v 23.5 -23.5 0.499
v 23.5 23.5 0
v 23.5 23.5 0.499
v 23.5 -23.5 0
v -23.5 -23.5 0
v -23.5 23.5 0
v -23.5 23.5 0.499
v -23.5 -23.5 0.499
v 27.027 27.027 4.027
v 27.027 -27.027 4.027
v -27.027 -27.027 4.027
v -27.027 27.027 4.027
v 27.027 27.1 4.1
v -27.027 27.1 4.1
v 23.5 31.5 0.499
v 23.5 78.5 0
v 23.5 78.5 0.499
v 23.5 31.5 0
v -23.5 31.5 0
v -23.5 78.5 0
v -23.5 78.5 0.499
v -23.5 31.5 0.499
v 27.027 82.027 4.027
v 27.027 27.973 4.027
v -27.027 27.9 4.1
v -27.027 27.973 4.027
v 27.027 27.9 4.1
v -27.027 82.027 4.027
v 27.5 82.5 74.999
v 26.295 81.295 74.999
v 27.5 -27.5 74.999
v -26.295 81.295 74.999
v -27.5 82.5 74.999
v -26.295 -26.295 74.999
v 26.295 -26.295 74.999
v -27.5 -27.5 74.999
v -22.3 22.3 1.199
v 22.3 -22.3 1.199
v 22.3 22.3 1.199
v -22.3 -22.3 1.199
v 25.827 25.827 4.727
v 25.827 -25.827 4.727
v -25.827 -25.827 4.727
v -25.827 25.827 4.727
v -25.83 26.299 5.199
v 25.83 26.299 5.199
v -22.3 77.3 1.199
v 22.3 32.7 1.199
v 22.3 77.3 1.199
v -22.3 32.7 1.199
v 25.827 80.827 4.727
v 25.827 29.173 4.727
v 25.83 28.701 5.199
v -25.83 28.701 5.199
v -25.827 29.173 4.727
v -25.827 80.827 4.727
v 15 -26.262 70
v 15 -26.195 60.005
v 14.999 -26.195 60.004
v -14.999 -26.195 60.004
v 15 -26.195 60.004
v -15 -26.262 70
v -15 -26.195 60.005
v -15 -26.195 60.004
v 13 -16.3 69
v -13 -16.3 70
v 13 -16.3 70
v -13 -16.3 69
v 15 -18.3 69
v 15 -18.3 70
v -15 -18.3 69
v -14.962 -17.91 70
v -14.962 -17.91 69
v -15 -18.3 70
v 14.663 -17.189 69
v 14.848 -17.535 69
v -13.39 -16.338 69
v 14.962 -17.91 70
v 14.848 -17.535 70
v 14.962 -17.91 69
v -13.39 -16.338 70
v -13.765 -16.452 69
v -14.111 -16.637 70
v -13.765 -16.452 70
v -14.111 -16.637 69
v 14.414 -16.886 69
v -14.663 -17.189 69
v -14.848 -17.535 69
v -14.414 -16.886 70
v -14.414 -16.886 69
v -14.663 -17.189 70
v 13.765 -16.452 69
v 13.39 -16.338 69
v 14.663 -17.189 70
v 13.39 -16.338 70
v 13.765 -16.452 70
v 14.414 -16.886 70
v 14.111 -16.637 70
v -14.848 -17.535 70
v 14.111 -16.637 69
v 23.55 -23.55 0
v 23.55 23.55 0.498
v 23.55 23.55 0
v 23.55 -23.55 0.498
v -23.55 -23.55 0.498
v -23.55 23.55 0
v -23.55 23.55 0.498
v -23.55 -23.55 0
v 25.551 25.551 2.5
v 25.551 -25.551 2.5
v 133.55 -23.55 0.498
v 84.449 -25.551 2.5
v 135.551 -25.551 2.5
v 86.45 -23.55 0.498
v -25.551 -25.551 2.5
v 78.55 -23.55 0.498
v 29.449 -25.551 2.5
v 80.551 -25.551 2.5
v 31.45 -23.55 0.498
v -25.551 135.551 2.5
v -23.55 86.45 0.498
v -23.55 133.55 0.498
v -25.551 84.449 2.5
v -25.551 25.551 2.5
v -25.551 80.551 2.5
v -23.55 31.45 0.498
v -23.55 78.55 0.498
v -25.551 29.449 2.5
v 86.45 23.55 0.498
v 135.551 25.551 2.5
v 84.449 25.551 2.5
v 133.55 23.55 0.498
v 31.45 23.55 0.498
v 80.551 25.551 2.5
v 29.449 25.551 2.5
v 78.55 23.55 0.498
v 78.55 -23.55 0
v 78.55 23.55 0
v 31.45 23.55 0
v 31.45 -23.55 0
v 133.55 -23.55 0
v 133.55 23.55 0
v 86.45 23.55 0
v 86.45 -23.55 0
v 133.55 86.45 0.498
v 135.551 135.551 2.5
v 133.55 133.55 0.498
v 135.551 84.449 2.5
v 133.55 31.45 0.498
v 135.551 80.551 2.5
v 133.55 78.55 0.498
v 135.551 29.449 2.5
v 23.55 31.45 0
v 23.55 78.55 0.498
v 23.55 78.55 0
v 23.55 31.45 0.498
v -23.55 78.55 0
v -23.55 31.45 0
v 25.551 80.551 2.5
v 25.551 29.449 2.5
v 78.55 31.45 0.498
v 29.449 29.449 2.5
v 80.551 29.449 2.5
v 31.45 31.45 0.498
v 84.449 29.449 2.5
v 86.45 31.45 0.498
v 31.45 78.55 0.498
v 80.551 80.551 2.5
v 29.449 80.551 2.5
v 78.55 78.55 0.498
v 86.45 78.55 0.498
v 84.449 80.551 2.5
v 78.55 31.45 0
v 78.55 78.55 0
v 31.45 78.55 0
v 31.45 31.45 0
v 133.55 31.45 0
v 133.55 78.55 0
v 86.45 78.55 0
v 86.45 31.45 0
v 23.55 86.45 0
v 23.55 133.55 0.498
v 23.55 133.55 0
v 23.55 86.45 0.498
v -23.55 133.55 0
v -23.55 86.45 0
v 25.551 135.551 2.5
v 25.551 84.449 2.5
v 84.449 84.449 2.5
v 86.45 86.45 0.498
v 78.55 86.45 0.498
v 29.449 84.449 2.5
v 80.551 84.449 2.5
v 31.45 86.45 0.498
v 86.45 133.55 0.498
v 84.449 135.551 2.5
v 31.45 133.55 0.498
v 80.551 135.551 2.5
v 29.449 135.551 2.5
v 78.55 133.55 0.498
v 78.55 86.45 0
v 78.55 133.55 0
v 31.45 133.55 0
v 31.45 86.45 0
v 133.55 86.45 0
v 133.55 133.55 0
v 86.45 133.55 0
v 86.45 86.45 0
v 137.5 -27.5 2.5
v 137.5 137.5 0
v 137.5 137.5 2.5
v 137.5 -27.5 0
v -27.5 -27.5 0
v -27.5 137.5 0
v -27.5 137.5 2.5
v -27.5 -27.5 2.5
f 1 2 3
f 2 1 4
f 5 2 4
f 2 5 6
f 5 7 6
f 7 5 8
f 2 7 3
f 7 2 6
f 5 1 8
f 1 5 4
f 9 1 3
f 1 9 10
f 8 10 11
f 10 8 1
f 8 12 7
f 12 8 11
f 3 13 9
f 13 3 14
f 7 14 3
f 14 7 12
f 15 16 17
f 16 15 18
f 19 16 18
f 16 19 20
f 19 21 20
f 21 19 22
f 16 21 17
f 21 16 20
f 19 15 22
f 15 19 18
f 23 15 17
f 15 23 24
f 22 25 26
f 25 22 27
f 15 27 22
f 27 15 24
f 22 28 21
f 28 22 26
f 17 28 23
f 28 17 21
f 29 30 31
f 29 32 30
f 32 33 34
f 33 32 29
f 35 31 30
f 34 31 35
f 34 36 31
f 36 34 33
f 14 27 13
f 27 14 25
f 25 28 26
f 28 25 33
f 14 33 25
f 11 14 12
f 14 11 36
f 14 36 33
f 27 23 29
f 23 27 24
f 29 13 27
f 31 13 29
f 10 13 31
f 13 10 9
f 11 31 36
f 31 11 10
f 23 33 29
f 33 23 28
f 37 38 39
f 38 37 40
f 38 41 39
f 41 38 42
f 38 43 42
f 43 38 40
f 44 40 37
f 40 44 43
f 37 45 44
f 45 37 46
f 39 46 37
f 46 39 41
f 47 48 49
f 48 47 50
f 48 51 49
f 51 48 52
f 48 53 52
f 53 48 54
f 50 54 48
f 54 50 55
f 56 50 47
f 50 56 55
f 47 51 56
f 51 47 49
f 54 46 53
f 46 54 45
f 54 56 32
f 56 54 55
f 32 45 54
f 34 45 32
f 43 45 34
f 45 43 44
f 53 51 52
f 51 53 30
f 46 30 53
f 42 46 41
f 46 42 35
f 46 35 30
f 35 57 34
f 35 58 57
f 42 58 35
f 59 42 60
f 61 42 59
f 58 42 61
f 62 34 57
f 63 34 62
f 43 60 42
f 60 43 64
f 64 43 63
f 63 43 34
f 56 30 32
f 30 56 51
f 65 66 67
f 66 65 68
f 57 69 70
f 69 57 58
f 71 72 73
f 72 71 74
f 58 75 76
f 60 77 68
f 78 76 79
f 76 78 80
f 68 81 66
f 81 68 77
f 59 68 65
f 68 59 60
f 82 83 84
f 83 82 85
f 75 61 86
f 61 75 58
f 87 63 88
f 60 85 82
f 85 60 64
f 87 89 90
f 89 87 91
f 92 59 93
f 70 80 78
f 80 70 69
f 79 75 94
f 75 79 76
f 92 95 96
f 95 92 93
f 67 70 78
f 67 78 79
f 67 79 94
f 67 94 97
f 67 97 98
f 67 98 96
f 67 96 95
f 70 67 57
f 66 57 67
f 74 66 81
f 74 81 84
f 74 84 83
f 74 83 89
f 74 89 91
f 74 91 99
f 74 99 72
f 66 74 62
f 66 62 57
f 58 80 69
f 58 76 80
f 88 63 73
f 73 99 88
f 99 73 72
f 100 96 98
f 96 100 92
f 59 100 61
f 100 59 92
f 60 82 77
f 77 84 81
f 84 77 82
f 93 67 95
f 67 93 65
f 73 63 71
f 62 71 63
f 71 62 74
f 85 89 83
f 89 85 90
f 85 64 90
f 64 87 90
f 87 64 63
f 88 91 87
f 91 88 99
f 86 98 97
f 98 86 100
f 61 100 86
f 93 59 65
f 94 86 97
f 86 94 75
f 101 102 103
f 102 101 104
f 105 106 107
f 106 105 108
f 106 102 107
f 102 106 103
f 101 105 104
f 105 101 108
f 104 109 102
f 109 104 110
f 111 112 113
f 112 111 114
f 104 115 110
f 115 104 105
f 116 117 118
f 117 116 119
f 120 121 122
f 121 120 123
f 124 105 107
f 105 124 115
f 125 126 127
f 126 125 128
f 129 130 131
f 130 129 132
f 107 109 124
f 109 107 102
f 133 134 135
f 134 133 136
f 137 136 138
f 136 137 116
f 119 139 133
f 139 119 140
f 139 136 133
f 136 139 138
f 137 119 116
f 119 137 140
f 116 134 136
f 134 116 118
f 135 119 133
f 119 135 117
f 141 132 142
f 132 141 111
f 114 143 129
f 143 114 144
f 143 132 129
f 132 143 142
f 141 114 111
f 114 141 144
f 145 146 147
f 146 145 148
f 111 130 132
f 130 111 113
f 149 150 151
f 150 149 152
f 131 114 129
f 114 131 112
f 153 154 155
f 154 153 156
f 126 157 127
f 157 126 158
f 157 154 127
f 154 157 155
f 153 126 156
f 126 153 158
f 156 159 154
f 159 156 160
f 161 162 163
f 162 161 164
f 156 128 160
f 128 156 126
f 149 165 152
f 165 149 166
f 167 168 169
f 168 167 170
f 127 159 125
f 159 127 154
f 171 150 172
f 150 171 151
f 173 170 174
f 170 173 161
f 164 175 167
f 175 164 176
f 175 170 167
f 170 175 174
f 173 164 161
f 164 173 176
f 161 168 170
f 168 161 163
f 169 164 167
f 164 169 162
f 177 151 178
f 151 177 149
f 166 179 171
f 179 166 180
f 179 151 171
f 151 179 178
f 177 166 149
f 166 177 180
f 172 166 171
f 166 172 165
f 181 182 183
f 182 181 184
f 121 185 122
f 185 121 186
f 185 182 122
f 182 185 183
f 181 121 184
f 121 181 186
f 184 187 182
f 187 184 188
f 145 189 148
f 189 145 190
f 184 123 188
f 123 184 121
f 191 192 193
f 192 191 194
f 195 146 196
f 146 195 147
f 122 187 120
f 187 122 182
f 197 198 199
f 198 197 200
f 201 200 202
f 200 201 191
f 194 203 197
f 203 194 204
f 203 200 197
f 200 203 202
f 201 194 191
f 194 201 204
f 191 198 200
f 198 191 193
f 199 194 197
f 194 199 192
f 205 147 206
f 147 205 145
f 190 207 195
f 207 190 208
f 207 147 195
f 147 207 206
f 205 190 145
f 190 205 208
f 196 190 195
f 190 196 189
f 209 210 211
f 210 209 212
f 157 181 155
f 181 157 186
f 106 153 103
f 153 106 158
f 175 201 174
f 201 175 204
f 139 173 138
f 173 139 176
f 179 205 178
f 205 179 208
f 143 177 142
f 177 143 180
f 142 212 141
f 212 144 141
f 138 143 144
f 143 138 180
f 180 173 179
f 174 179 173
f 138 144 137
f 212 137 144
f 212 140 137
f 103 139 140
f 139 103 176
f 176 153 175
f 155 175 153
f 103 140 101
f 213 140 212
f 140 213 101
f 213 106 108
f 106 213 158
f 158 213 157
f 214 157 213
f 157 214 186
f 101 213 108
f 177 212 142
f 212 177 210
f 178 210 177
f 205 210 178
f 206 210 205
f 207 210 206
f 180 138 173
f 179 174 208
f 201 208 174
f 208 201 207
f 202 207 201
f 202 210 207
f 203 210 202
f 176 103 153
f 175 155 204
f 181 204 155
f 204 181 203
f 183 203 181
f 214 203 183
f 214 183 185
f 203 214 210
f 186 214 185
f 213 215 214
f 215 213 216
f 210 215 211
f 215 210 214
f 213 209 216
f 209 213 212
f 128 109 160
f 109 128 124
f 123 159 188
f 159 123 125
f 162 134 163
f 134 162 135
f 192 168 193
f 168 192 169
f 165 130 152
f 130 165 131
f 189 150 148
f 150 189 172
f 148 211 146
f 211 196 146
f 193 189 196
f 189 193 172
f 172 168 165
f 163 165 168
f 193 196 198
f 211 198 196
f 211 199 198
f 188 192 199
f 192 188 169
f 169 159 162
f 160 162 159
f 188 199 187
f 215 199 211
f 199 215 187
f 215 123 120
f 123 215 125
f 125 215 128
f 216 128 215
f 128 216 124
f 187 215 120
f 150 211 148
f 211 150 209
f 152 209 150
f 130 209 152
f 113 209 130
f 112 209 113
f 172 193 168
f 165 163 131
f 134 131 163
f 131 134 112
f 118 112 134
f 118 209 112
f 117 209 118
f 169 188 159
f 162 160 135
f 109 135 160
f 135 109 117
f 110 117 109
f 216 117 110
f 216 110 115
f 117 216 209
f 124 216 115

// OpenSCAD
// file: ../src/assorter.scad
// Variables

e=0.001;

x = 2;
y = 3;

//box();
//grid();
//slice();
//stack();

function middle(times) = -length_default/2 +(length_default+(times-1)*pitch_default)/2 ;
left   = -length_default/2 ;
front  = -length_default/2 ;
right  =  length_default/2+(x-1)*pitch_default ;
back   =  length_default/2+(y-1)*pitch_default ;
bottom =  0;
top    =  height_default;


grid_height = lift_default + triangle_height_default - cut_default ;

module body_form(
A,B,K,L,height
){
    polyhedron(
        points = [
            [-A,-B, 0],       // 0
            [ A,-B, 0],       // 1
            [ A, B, 0],       // 2
            [-A, B, 0],       // 3
            [-K,-L, height],  // 0
            [ K,-L, height],  // 1
            [ K, L, height],  // 2
            [-K, L, height]], // 3
        faces = [
            [0,1,2,3],  // bottom
            [4,5,1,0],  // front
            [7,6,5,4],  // top
            [5,6,2,1],  // right
            [6,7,3,2],  // back
            [7,4,0,3]] // left
        );
}

module box_bottom(
  lift = lift_default,
  length = length_default,
  height = height_default ,
  triangle_height = triangle_height_default,
  bottom = true, // if the bottom should be added or not... (the inner one should not have it)
){

    // größere
    K = length/2 ;
    L = K;
    // kleinere
    A = (length-2*triangle_height)/2;
    B = A;
    remaining_height = height - lift - triangle_height;
    if (bottom) {
    translate([0,0,(lift+1)/2])
        cube([2*A,2*B,lift+1],center=true);
    }
    translate([0,0,lift-e])
    // creates an inverted cut pyramid
    body_form(A,B,K,L,triangle_height+e);

}

module solid_box(
  x = x,
  y = y,
  lift = lift_default,
  length = length_default,
  height = height_default ,
  triangle_height = triangle_height_default,
  pitch = pitch_default,
  bottom = true,
  cut_sides = true,
  fill_pyramid_tip = false,
){
    difference(){
    union(){
        remaining_height = height - lift - triangle_height;
        for (m = [0:y-1]){
            for (n = [0:x-1])
                translate([n*pitch,m*pitch,0])
                    box_bottom(length=length,bottom=bottom);
        }
        translate([-length/2,-length/2,lift + triangle_height-e])
            cube([(x-1)*pitch+length,(y-1)*pitch +length,remaining_height]);

        if (fill_pyramid_tip){
            // fill the gaps inside the pyramids *shrug*
            translate([-length/2,-length/2,triangle_height+0.1])
                cube([(x-1)*pitch+length,(y-1)*pitch +length,1]);
        }
    }
    if (cut_sides) {
        // cut left side of box
        translate([-length/2,-length/2-2,0])
            cut_object(length = (y-1)*pitch +length +4 );

        // cut right side of box
        translate([(x-1)*pitch+length/2,-length/2-2,0])
        mirror(v=[1,0,0])
            cut_object(length = (y-1)*pitch +length +4 );

        // cut front side of box
        //translate([(x-1)*pitch+length/2,-length/2-2,0])
        translate([-length/2-2,-length/2,0])
        rotate([0,0,-90])
        mirror(v=[1,0,0])
            cut_object(length = (x-1)*pitch +length +4 );

        // cut back side of box
        translate([-length/2-2,length/2+(y-1)*pitch,0])
        rotate([0,0,-90])
            cut_object(length = (x-1)*pitch +length +4 );
        }
    }

}

module box(
    x = x,
    y = y,
    handle_enable = true
){
    difference(){
        solid_box(x=x,y=y,fill_pyramid_tip=true);
        // inner solid box without the cubed lift on the bottom.. now the wall thickness looks quite okay
        // we have to lower the innter box about lift_default distance again
        translate([0,0,wall_thickness_default- lift_default])
            solid_box(x=x,y=y,length = length_default - 2* wall_thickness_default,bottom=false);
    }
    if (handle_enable) {
        // add handle
        translate([
            middle(x),
            -length_default/2+wall_thickness_default,
            height_default-handle_top_distance
        ])
            handle();
    }
}

module grid(
  x = x,
  y = y,
  lift = lift_default,
  length = length_default,
  height = height_default ,
  triangle_height = triangle_height_default,
  pitch = pitch_default
){
    difference(){
    // main body
        union(){
            difference(){
                translate([-length/2,-length/2,0])
                cube([(x-1)*pitch+length,(y-1)*pitch +length,lift+triangle_height]);

                translate([0,0,-e])
                    solid_box(x=x,y=y,length= length_default + 0.1, cut_sides = false );     // do we need some added clearence here?
            }
        }

    translate([-length/2-1,-length/2-1,lift + triangle_height - cut_default])
        cube([(x-1)*pitch+length+2,(y-1)*pitch +length + 2,2]);
    }
}


module cut_object(
    length = length_default,
    height = height_default,
    diff_bottom = diff_bottom_default,

){
    rotate([-90,0,0])
    linear_extrude(height=length)

        polygon(
            [   [-e,0],
                [-e,-height],
                [0,-height],
                [diff_bottom,0]
            ]
            );
}

module slice() {
    difference(){
        box();
        translate([-length_default/2-10,-length_default/2-10,-5])
        cube([
            1/2*(length_default+(x-1)*pitch_default + 20),
            length_default+(y-1)*pitch_default +20,
            height_default+10]);
    }
}

module handle(){
    r = 2;
    $fa = 1;
    $fs = 0.4;

    rotate([0,180,0])
    hull(){
        hull(){
            //left corner
            translate([-handle_width/2,0,0])
                cube([1,1,handle_top_height ]);

            // right corner
            translate([handle_width/2,0,0])
            translate([-1,0,0])
                cube([1,1,handle_top_height ]);

            // left round corner
            translate([-handle_width/2,handle_depth])
            translate([r,-r,0])
            cylinder(r=r,h=handle_top_height);

            // right round corner
            translate([handle_width/2,handle_depth])
            translate([-r,-r,0])
            cylinder(r=r,h=handle_top_height );
        }

        // hull anchor
        height = handle_depth / tan(handle_angle);

        translate([-handle_width/2,0,0])
            cube([handle_width,0.1,height]);
    }
}

module stack(){
    // module to preview a stacked box
    slice();
    translate([0,0,height_default-handle_top_distance ])
    slice();
}
// file: ../src/base/defaults.scad
//default variables for this project

//Normal
length_default = 55;
pitch_default = 55 ;

height_default = 75;

triangle_height_default = 4 ;
triangle_width_default  = 2 * triangle_height_default;
cut_default=2;
lift_default=0.5;

wall_thickness_default = 1.2;

handle_width = 30;
handle_depth = 10;

handle_top_height = 1;
handle_angle = 45; // degree
handle_top_distance = 5;

diff_bottom_default = 0.5;
// main file
include <../src/base/defaults.scad>
include <../src/assorter.scad>

x = 1;
y = 1;

box(x=1,y=2);
grid(x=3,y=3);
